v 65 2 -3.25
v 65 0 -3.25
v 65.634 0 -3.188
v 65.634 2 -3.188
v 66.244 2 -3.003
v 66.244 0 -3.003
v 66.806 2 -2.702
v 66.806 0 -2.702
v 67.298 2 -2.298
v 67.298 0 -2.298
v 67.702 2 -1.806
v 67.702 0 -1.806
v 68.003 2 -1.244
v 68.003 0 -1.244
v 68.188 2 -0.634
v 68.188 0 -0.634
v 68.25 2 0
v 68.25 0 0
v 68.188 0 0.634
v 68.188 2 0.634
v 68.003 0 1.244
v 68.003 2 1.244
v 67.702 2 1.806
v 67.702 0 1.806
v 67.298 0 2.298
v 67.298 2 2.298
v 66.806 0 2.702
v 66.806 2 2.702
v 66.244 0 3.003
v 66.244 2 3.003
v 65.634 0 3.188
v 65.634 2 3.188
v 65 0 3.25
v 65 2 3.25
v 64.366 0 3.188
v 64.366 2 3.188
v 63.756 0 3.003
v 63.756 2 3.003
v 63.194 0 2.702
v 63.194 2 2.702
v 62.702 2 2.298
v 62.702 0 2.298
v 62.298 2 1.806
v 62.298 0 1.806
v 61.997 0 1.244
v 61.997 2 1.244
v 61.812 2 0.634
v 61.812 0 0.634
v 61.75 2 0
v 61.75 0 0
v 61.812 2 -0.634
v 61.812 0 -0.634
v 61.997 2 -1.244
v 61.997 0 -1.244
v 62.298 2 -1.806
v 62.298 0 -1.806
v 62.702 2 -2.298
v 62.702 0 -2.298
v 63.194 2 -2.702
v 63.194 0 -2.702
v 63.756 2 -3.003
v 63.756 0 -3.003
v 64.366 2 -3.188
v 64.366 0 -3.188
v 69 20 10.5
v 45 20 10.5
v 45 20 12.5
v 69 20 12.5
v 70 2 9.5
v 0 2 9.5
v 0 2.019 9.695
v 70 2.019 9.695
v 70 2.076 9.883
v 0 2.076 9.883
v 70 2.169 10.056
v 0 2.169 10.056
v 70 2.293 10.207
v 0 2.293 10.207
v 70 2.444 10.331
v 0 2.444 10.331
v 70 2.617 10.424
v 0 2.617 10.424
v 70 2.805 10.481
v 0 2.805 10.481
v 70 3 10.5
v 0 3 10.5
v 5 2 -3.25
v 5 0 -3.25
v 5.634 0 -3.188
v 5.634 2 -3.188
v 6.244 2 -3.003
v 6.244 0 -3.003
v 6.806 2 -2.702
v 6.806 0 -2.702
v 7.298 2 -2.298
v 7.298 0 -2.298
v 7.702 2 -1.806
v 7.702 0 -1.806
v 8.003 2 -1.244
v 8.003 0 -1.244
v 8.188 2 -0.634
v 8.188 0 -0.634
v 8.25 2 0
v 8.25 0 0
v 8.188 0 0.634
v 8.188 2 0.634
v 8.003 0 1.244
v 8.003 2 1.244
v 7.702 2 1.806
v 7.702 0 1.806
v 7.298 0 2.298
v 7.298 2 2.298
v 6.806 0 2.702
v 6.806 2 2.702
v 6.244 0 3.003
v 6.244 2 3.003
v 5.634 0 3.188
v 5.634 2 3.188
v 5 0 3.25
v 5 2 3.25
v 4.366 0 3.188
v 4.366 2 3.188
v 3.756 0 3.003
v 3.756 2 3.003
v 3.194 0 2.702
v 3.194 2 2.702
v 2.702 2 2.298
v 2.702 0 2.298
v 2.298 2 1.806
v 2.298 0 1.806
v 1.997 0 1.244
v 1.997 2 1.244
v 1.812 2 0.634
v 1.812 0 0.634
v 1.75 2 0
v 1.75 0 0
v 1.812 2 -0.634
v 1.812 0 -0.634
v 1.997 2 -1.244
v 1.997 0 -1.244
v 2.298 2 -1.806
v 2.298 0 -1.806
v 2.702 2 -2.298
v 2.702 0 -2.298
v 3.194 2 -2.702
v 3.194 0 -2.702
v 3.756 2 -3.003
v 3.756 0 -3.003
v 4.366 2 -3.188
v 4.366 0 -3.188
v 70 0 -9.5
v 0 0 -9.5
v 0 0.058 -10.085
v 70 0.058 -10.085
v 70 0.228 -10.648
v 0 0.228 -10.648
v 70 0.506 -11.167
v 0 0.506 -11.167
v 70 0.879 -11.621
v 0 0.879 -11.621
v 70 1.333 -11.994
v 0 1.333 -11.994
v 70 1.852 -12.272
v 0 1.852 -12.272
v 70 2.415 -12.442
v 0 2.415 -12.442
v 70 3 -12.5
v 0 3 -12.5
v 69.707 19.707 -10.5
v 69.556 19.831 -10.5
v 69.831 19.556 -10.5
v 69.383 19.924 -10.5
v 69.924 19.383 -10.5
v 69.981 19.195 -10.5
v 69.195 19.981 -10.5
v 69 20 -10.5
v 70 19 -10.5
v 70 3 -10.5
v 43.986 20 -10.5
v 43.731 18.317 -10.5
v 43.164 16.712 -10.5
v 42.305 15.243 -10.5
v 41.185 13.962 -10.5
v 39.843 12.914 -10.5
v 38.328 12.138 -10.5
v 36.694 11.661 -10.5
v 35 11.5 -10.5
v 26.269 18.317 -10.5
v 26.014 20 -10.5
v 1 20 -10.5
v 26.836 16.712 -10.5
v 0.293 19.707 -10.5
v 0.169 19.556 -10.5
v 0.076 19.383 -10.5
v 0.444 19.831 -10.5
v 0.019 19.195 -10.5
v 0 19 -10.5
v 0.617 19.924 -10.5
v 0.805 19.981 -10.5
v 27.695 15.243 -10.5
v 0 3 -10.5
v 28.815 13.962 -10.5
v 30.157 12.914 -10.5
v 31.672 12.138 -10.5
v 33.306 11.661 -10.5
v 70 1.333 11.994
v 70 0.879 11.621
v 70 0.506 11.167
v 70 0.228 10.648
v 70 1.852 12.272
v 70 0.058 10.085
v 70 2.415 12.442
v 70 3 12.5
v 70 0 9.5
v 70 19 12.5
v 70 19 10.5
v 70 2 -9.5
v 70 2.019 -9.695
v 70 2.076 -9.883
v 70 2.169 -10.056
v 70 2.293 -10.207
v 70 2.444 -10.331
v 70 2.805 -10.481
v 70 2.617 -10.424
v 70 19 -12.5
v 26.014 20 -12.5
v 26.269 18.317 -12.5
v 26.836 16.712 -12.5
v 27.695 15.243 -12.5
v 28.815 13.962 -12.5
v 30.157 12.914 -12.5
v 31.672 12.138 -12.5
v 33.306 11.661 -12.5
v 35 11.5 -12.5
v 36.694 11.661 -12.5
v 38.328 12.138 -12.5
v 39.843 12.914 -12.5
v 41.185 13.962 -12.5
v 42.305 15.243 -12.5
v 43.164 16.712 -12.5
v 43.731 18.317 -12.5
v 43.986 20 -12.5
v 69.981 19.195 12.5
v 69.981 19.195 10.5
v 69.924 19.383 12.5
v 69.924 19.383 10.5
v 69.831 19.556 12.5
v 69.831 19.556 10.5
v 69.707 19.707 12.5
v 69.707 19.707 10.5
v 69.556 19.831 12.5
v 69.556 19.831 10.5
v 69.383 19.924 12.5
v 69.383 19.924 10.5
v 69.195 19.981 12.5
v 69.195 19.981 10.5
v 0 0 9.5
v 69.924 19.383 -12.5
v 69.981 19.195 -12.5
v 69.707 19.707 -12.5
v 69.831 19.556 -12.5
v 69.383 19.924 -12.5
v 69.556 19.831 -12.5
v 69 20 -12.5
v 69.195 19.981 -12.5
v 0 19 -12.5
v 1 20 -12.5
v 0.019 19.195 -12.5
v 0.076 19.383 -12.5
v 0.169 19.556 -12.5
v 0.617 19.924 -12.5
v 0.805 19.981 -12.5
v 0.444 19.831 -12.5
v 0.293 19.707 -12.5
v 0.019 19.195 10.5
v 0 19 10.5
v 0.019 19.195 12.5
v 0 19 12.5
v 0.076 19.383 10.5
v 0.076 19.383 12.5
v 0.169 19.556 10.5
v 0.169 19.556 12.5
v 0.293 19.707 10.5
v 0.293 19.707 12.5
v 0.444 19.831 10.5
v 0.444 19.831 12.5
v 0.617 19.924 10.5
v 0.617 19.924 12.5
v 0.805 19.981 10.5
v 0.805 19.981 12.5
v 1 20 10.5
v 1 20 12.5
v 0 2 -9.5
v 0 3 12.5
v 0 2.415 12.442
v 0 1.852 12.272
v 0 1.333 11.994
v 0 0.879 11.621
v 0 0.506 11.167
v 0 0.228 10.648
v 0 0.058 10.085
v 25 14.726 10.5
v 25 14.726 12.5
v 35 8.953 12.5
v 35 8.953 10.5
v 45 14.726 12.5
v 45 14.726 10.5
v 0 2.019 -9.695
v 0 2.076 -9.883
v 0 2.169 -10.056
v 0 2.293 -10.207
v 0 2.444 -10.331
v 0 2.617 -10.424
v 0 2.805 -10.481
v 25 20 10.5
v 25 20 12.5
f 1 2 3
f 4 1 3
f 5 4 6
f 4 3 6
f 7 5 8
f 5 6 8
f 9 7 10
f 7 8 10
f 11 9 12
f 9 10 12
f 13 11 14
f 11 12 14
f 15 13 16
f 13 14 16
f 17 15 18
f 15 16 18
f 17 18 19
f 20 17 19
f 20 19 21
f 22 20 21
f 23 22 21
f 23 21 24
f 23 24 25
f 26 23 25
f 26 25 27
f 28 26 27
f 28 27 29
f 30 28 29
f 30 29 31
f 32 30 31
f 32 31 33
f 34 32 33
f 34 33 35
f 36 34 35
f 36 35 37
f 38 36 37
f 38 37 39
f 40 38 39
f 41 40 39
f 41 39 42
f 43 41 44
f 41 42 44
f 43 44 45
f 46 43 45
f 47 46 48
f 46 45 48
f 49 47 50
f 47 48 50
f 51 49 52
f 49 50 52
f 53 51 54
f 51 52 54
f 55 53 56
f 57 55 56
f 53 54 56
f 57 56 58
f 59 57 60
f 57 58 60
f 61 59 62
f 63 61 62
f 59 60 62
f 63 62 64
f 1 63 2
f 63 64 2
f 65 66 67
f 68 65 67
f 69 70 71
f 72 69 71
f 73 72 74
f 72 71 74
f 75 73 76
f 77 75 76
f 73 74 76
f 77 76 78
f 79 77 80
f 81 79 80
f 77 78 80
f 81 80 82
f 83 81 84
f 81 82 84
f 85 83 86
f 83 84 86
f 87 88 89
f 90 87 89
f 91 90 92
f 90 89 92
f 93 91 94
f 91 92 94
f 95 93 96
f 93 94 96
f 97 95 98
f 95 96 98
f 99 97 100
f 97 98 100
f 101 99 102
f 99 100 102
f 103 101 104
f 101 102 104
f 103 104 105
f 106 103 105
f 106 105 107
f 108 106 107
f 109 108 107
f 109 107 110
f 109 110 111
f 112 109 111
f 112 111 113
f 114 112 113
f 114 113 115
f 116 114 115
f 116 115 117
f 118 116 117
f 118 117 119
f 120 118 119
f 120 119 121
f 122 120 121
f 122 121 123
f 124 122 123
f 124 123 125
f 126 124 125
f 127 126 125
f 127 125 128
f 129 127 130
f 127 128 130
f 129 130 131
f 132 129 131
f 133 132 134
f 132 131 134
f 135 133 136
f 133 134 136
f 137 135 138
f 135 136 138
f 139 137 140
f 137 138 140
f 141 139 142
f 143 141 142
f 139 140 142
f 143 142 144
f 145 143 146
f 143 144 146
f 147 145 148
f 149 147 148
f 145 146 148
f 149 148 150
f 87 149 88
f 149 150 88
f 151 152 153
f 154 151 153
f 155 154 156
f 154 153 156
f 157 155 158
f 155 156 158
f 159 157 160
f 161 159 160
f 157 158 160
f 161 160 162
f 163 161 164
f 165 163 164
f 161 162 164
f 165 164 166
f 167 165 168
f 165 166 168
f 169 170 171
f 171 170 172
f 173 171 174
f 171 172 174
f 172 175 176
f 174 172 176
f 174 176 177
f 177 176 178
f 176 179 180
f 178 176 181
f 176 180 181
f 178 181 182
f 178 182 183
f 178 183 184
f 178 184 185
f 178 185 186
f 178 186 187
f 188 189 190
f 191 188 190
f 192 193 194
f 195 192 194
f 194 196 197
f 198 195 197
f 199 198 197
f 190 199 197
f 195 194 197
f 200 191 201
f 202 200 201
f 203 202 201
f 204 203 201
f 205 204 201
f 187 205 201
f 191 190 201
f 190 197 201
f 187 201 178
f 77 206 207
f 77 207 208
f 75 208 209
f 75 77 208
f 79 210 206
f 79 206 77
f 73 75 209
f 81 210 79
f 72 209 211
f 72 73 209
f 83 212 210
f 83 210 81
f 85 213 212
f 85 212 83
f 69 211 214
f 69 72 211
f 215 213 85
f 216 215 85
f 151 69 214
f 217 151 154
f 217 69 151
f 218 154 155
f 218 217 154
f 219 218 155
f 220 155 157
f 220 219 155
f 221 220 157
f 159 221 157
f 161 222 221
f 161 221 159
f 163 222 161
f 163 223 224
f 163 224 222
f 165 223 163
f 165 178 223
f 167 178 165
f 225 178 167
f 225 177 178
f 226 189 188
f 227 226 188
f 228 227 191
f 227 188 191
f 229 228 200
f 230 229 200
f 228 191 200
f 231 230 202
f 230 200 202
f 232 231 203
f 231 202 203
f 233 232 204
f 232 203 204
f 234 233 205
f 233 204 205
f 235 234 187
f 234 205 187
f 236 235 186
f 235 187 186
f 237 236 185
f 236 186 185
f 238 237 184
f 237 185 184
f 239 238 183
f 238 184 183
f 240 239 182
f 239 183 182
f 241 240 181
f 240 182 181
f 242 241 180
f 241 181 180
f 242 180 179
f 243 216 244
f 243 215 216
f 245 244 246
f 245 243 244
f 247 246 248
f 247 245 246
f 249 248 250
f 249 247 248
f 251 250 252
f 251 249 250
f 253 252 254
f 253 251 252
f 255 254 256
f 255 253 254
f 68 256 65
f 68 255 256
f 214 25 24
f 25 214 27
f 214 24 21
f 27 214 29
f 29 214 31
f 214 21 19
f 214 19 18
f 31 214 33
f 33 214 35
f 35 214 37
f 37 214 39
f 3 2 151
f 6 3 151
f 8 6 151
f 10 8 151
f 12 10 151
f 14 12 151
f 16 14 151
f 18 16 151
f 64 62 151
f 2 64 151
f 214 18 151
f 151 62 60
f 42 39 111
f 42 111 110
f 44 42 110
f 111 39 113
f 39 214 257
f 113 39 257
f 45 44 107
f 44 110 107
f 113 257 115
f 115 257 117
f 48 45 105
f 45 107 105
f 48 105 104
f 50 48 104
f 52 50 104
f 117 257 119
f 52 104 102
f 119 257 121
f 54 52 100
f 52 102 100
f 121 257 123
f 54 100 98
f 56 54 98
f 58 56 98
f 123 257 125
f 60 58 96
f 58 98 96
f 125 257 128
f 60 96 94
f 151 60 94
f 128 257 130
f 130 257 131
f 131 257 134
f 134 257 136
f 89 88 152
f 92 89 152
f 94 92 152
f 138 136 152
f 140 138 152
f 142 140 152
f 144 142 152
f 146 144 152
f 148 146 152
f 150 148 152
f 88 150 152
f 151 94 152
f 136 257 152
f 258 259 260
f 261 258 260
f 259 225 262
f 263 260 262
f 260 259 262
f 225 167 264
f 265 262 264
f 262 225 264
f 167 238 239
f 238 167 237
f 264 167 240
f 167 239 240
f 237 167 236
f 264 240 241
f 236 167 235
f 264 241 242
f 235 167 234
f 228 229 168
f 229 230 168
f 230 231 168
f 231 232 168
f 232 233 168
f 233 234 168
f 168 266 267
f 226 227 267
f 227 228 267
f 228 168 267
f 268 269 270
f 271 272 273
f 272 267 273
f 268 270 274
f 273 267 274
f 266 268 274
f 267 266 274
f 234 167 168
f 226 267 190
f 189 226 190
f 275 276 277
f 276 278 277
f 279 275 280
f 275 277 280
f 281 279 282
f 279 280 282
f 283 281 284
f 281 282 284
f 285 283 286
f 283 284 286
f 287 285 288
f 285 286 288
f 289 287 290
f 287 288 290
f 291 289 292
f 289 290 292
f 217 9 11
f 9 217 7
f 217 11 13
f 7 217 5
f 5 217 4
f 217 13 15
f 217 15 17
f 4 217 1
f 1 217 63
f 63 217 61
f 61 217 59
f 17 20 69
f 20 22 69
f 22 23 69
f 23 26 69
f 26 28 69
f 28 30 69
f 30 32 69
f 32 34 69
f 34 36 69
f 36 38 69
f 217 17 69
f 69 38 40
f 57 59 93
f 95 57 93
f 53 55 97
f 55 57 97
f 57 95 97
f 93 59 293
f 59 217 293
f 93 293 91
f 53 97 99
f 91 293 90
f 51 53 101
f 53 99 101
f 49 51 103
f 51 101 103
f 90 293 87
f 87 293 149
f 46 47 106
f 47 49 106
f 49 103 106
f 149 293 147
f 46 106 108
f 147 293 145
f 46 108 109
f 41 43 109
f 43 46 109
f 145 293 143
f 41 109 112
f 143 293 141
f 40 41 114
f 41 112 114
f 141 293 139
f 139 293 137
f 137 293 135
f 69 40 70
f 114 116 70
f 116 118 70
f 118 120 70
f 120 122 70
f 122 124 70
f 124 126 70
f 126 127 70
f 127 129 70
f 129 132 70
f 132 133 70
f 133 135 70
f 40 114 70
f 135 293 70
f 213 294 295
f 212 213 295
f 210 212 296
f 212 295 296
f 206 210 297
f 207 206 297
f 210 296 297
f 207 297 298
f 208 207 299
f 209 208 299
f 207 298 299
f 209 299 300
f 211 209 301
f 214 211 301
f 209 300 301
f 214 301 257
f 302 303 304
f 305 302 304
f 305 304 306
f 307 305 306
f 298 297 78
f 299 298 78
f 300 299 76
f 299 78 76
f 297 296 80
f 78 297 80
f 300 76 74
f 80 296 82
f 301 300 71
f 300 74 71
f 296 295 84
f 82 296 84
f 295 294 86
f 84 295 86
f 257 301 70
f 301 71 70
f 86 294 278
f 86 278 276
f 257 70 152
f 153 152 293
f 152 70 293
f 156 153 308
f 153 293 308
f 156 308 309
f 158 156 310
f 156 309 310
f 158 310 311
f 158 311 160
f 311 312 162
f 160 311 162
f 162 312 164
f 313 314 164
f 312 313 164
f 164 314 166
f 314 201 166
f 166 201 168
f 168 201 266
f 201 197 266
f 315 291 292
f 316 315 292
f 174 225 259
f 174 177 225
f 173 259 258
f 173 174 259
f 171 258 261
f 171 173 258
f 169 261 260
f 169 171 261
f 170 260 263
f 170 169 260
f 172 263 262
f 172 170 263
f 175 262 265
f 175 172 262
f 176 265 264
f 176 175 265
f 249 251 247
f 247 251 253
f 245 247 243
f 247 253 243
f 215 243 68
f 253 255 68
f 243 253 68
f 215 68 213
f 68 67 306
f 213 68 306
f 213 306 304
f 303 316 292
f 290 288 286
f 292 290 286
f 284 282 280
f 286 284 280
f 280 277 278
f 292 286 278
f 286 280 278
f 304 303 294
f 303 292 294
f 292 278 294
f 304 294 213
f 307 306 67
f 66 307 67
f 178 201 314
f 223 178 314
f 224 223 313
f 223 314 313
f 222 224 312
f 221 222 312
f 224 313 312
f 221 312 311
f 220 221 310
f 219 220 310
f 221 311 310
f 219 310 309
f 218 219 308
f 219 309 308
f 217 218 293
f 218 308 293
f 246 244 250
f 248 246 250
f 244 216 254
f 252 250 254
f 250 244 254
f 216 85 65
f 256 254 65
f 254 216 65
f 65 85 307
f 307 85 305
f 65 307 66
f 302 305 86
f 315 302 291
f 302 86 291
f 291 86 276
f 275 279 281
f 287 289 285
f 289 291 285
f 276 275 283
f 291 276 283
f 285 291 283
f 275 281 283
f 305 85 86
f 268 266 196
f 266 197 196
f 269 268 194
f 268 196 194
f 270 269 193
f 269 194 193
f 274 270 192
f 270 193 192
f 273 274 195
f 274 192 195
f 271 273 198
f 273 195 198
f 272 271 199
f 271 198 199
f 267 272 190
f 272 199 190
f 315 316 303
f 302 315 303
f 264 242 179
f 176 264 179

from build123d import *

# Parameters (mm, degrees)
BASE_FLANGE1_DEPTH = 70
CUT_EXTRUDE1_REACH = 78.974
CUT_EXTRUDE2_REACH = 78.348
SKETCH7_R          = 9
CUT_EXTRUDE3_REACH = 75.866
SKETCH8_R          = 3.25
FILLET1_R          = 1


# Sheet-metal steps are written as plain solids
with BuildPart() as part:
    # Sketch1 → Base-Flange1 (new body)
    with BuildSketch(Plane(origin=(0, 0, 0), x_dir=(0, 0, -1), z_dir=(1, 0, 0))):
        with BuildLine():
            Line((-12.5, 20), (-12.5, 3))
            ThreePointArc((-12.5, 3), (-11.621320344, 0.878679656), (-9.5, 0))
            Line((-9.5, 0), (9.5, 0))
            ThreePointArc((9.5, 0), (11.621320344, 0.878679656), (12.5, 3))
            Line((12.5, 3), (12.5, 20))
            Line((12.5, 20), (10.5, 20))
            Line((10.5, 20), (10.5, 3))
            ThreePointArc((10.5, 3), (10.207106781, 2.292893219), (9.5, 2))
            Line((9.5, 2), (-9.5, 2))
            ThreePointArc((-9.5, 2), (-10.207106781, 2.292893219), (-10.5, 3))
            Line((-10.5, 3), (-10.5, 20))
            Line((-10.5, 20), (-12.5, 20))
        make_face()
    extrude(amount=BASE_FLANGE1_DEPTH)

    # Sketch6 → Cut-Extrude1 (cut, up to next)
    with BuildSketch(Plane.XY.offset(12.5), mode=Mode.PRIVATE) as cut_extrude1_sk1:
        Polygon((35, 8.952994616), (45, 14.726497308), (45, 26.273502692), (35, 32.047005384), (25, 26.273502692), (25, 14.726497308), align=None)
    cut_extrude1_tool1 = extrude(cut_extrude1_sk1.sketch, amount=-CUT_EXTRUDE1_REACH, mode=Mode.PRIVATE) & part.part
    add(cut_extrude1_tool1.solids().sort_by_distance((35, 20.5, 12.5))[0], mode=Mode.SUBTRACT)

    # Sketch7 → Cut-Extrude2 (cut, up to next)
    with BuildSketch(Plane.XY.offset(-10.5), mode=Mode.PRIVATE) as cut_extrude2_sk1:
        with Locations((35, 20.5)):
            Circle(SKETCH7_R)
    cut_extrude2_tool1 = extrude(cut_extrude2_sk1.sketch, amount=-CUT_EXTRUDE2_REACH, mode=Mode.PRIVATE) & part.part
    add(cut_extrude2_tool1.solids().sort_by_distance((35, 20.5, -10.5))[0], mode=Mode.SUBTRACT)

    # Sketch8 → Cut-Extrude3 (cut, up to next)
    with BuildSketch(Plane.XZ, mode=Mode.PRIVATE) as cut_extrude3_sk1:
        with Locations(Location((65, 0, 0), (0, 0, 270))):
            Circle(SKETCH8_R)
    cut_extrude3_tool1 = extrude(cut_extrude3_sk1.sketch, amount=-CUT_EXTRUDE3_REACH, mode=Mode.PRIVATE) & part.part
    # Sketch8 → Cut-Extrude3 (cut, up to next)
    with BuildSketch(Plane.XZ, mode=Mode.PRIVATE) as cut_extrude3_sk2:
        with Locations(Location((5, 0, 0), (0, 0, 270))):
            Circle(SKETCH8_R)
    cut_extrude3_tool2 = extrude(cut_extrude3_sk2.sketch, amount=-CUT_EXTRUDE3_REACH, mode=Mode.PRIVATE) & part.part
    add(cut_extrude3_tool1.solids().sort_by_distance((65, 0, 0))[0], mode=Mode.SUBTRACT)
    add(cut_extrude3_tool2.solids().sort_by_distance((5, 0, 0))[0], mode=Mode.SUBTRACT)

    # Fillet1
    fillet1_edges = [part.edges().sort_by_distance(p)[0] for p in [
        (0, 20, -11.5),
        (0, 20, 11.5),
        (70, 20, -11.5),
        (70, 20, 11.5),
    ]]
    fillet(fillet1_edges, radius=FILLET1_R)


solid = part.part
